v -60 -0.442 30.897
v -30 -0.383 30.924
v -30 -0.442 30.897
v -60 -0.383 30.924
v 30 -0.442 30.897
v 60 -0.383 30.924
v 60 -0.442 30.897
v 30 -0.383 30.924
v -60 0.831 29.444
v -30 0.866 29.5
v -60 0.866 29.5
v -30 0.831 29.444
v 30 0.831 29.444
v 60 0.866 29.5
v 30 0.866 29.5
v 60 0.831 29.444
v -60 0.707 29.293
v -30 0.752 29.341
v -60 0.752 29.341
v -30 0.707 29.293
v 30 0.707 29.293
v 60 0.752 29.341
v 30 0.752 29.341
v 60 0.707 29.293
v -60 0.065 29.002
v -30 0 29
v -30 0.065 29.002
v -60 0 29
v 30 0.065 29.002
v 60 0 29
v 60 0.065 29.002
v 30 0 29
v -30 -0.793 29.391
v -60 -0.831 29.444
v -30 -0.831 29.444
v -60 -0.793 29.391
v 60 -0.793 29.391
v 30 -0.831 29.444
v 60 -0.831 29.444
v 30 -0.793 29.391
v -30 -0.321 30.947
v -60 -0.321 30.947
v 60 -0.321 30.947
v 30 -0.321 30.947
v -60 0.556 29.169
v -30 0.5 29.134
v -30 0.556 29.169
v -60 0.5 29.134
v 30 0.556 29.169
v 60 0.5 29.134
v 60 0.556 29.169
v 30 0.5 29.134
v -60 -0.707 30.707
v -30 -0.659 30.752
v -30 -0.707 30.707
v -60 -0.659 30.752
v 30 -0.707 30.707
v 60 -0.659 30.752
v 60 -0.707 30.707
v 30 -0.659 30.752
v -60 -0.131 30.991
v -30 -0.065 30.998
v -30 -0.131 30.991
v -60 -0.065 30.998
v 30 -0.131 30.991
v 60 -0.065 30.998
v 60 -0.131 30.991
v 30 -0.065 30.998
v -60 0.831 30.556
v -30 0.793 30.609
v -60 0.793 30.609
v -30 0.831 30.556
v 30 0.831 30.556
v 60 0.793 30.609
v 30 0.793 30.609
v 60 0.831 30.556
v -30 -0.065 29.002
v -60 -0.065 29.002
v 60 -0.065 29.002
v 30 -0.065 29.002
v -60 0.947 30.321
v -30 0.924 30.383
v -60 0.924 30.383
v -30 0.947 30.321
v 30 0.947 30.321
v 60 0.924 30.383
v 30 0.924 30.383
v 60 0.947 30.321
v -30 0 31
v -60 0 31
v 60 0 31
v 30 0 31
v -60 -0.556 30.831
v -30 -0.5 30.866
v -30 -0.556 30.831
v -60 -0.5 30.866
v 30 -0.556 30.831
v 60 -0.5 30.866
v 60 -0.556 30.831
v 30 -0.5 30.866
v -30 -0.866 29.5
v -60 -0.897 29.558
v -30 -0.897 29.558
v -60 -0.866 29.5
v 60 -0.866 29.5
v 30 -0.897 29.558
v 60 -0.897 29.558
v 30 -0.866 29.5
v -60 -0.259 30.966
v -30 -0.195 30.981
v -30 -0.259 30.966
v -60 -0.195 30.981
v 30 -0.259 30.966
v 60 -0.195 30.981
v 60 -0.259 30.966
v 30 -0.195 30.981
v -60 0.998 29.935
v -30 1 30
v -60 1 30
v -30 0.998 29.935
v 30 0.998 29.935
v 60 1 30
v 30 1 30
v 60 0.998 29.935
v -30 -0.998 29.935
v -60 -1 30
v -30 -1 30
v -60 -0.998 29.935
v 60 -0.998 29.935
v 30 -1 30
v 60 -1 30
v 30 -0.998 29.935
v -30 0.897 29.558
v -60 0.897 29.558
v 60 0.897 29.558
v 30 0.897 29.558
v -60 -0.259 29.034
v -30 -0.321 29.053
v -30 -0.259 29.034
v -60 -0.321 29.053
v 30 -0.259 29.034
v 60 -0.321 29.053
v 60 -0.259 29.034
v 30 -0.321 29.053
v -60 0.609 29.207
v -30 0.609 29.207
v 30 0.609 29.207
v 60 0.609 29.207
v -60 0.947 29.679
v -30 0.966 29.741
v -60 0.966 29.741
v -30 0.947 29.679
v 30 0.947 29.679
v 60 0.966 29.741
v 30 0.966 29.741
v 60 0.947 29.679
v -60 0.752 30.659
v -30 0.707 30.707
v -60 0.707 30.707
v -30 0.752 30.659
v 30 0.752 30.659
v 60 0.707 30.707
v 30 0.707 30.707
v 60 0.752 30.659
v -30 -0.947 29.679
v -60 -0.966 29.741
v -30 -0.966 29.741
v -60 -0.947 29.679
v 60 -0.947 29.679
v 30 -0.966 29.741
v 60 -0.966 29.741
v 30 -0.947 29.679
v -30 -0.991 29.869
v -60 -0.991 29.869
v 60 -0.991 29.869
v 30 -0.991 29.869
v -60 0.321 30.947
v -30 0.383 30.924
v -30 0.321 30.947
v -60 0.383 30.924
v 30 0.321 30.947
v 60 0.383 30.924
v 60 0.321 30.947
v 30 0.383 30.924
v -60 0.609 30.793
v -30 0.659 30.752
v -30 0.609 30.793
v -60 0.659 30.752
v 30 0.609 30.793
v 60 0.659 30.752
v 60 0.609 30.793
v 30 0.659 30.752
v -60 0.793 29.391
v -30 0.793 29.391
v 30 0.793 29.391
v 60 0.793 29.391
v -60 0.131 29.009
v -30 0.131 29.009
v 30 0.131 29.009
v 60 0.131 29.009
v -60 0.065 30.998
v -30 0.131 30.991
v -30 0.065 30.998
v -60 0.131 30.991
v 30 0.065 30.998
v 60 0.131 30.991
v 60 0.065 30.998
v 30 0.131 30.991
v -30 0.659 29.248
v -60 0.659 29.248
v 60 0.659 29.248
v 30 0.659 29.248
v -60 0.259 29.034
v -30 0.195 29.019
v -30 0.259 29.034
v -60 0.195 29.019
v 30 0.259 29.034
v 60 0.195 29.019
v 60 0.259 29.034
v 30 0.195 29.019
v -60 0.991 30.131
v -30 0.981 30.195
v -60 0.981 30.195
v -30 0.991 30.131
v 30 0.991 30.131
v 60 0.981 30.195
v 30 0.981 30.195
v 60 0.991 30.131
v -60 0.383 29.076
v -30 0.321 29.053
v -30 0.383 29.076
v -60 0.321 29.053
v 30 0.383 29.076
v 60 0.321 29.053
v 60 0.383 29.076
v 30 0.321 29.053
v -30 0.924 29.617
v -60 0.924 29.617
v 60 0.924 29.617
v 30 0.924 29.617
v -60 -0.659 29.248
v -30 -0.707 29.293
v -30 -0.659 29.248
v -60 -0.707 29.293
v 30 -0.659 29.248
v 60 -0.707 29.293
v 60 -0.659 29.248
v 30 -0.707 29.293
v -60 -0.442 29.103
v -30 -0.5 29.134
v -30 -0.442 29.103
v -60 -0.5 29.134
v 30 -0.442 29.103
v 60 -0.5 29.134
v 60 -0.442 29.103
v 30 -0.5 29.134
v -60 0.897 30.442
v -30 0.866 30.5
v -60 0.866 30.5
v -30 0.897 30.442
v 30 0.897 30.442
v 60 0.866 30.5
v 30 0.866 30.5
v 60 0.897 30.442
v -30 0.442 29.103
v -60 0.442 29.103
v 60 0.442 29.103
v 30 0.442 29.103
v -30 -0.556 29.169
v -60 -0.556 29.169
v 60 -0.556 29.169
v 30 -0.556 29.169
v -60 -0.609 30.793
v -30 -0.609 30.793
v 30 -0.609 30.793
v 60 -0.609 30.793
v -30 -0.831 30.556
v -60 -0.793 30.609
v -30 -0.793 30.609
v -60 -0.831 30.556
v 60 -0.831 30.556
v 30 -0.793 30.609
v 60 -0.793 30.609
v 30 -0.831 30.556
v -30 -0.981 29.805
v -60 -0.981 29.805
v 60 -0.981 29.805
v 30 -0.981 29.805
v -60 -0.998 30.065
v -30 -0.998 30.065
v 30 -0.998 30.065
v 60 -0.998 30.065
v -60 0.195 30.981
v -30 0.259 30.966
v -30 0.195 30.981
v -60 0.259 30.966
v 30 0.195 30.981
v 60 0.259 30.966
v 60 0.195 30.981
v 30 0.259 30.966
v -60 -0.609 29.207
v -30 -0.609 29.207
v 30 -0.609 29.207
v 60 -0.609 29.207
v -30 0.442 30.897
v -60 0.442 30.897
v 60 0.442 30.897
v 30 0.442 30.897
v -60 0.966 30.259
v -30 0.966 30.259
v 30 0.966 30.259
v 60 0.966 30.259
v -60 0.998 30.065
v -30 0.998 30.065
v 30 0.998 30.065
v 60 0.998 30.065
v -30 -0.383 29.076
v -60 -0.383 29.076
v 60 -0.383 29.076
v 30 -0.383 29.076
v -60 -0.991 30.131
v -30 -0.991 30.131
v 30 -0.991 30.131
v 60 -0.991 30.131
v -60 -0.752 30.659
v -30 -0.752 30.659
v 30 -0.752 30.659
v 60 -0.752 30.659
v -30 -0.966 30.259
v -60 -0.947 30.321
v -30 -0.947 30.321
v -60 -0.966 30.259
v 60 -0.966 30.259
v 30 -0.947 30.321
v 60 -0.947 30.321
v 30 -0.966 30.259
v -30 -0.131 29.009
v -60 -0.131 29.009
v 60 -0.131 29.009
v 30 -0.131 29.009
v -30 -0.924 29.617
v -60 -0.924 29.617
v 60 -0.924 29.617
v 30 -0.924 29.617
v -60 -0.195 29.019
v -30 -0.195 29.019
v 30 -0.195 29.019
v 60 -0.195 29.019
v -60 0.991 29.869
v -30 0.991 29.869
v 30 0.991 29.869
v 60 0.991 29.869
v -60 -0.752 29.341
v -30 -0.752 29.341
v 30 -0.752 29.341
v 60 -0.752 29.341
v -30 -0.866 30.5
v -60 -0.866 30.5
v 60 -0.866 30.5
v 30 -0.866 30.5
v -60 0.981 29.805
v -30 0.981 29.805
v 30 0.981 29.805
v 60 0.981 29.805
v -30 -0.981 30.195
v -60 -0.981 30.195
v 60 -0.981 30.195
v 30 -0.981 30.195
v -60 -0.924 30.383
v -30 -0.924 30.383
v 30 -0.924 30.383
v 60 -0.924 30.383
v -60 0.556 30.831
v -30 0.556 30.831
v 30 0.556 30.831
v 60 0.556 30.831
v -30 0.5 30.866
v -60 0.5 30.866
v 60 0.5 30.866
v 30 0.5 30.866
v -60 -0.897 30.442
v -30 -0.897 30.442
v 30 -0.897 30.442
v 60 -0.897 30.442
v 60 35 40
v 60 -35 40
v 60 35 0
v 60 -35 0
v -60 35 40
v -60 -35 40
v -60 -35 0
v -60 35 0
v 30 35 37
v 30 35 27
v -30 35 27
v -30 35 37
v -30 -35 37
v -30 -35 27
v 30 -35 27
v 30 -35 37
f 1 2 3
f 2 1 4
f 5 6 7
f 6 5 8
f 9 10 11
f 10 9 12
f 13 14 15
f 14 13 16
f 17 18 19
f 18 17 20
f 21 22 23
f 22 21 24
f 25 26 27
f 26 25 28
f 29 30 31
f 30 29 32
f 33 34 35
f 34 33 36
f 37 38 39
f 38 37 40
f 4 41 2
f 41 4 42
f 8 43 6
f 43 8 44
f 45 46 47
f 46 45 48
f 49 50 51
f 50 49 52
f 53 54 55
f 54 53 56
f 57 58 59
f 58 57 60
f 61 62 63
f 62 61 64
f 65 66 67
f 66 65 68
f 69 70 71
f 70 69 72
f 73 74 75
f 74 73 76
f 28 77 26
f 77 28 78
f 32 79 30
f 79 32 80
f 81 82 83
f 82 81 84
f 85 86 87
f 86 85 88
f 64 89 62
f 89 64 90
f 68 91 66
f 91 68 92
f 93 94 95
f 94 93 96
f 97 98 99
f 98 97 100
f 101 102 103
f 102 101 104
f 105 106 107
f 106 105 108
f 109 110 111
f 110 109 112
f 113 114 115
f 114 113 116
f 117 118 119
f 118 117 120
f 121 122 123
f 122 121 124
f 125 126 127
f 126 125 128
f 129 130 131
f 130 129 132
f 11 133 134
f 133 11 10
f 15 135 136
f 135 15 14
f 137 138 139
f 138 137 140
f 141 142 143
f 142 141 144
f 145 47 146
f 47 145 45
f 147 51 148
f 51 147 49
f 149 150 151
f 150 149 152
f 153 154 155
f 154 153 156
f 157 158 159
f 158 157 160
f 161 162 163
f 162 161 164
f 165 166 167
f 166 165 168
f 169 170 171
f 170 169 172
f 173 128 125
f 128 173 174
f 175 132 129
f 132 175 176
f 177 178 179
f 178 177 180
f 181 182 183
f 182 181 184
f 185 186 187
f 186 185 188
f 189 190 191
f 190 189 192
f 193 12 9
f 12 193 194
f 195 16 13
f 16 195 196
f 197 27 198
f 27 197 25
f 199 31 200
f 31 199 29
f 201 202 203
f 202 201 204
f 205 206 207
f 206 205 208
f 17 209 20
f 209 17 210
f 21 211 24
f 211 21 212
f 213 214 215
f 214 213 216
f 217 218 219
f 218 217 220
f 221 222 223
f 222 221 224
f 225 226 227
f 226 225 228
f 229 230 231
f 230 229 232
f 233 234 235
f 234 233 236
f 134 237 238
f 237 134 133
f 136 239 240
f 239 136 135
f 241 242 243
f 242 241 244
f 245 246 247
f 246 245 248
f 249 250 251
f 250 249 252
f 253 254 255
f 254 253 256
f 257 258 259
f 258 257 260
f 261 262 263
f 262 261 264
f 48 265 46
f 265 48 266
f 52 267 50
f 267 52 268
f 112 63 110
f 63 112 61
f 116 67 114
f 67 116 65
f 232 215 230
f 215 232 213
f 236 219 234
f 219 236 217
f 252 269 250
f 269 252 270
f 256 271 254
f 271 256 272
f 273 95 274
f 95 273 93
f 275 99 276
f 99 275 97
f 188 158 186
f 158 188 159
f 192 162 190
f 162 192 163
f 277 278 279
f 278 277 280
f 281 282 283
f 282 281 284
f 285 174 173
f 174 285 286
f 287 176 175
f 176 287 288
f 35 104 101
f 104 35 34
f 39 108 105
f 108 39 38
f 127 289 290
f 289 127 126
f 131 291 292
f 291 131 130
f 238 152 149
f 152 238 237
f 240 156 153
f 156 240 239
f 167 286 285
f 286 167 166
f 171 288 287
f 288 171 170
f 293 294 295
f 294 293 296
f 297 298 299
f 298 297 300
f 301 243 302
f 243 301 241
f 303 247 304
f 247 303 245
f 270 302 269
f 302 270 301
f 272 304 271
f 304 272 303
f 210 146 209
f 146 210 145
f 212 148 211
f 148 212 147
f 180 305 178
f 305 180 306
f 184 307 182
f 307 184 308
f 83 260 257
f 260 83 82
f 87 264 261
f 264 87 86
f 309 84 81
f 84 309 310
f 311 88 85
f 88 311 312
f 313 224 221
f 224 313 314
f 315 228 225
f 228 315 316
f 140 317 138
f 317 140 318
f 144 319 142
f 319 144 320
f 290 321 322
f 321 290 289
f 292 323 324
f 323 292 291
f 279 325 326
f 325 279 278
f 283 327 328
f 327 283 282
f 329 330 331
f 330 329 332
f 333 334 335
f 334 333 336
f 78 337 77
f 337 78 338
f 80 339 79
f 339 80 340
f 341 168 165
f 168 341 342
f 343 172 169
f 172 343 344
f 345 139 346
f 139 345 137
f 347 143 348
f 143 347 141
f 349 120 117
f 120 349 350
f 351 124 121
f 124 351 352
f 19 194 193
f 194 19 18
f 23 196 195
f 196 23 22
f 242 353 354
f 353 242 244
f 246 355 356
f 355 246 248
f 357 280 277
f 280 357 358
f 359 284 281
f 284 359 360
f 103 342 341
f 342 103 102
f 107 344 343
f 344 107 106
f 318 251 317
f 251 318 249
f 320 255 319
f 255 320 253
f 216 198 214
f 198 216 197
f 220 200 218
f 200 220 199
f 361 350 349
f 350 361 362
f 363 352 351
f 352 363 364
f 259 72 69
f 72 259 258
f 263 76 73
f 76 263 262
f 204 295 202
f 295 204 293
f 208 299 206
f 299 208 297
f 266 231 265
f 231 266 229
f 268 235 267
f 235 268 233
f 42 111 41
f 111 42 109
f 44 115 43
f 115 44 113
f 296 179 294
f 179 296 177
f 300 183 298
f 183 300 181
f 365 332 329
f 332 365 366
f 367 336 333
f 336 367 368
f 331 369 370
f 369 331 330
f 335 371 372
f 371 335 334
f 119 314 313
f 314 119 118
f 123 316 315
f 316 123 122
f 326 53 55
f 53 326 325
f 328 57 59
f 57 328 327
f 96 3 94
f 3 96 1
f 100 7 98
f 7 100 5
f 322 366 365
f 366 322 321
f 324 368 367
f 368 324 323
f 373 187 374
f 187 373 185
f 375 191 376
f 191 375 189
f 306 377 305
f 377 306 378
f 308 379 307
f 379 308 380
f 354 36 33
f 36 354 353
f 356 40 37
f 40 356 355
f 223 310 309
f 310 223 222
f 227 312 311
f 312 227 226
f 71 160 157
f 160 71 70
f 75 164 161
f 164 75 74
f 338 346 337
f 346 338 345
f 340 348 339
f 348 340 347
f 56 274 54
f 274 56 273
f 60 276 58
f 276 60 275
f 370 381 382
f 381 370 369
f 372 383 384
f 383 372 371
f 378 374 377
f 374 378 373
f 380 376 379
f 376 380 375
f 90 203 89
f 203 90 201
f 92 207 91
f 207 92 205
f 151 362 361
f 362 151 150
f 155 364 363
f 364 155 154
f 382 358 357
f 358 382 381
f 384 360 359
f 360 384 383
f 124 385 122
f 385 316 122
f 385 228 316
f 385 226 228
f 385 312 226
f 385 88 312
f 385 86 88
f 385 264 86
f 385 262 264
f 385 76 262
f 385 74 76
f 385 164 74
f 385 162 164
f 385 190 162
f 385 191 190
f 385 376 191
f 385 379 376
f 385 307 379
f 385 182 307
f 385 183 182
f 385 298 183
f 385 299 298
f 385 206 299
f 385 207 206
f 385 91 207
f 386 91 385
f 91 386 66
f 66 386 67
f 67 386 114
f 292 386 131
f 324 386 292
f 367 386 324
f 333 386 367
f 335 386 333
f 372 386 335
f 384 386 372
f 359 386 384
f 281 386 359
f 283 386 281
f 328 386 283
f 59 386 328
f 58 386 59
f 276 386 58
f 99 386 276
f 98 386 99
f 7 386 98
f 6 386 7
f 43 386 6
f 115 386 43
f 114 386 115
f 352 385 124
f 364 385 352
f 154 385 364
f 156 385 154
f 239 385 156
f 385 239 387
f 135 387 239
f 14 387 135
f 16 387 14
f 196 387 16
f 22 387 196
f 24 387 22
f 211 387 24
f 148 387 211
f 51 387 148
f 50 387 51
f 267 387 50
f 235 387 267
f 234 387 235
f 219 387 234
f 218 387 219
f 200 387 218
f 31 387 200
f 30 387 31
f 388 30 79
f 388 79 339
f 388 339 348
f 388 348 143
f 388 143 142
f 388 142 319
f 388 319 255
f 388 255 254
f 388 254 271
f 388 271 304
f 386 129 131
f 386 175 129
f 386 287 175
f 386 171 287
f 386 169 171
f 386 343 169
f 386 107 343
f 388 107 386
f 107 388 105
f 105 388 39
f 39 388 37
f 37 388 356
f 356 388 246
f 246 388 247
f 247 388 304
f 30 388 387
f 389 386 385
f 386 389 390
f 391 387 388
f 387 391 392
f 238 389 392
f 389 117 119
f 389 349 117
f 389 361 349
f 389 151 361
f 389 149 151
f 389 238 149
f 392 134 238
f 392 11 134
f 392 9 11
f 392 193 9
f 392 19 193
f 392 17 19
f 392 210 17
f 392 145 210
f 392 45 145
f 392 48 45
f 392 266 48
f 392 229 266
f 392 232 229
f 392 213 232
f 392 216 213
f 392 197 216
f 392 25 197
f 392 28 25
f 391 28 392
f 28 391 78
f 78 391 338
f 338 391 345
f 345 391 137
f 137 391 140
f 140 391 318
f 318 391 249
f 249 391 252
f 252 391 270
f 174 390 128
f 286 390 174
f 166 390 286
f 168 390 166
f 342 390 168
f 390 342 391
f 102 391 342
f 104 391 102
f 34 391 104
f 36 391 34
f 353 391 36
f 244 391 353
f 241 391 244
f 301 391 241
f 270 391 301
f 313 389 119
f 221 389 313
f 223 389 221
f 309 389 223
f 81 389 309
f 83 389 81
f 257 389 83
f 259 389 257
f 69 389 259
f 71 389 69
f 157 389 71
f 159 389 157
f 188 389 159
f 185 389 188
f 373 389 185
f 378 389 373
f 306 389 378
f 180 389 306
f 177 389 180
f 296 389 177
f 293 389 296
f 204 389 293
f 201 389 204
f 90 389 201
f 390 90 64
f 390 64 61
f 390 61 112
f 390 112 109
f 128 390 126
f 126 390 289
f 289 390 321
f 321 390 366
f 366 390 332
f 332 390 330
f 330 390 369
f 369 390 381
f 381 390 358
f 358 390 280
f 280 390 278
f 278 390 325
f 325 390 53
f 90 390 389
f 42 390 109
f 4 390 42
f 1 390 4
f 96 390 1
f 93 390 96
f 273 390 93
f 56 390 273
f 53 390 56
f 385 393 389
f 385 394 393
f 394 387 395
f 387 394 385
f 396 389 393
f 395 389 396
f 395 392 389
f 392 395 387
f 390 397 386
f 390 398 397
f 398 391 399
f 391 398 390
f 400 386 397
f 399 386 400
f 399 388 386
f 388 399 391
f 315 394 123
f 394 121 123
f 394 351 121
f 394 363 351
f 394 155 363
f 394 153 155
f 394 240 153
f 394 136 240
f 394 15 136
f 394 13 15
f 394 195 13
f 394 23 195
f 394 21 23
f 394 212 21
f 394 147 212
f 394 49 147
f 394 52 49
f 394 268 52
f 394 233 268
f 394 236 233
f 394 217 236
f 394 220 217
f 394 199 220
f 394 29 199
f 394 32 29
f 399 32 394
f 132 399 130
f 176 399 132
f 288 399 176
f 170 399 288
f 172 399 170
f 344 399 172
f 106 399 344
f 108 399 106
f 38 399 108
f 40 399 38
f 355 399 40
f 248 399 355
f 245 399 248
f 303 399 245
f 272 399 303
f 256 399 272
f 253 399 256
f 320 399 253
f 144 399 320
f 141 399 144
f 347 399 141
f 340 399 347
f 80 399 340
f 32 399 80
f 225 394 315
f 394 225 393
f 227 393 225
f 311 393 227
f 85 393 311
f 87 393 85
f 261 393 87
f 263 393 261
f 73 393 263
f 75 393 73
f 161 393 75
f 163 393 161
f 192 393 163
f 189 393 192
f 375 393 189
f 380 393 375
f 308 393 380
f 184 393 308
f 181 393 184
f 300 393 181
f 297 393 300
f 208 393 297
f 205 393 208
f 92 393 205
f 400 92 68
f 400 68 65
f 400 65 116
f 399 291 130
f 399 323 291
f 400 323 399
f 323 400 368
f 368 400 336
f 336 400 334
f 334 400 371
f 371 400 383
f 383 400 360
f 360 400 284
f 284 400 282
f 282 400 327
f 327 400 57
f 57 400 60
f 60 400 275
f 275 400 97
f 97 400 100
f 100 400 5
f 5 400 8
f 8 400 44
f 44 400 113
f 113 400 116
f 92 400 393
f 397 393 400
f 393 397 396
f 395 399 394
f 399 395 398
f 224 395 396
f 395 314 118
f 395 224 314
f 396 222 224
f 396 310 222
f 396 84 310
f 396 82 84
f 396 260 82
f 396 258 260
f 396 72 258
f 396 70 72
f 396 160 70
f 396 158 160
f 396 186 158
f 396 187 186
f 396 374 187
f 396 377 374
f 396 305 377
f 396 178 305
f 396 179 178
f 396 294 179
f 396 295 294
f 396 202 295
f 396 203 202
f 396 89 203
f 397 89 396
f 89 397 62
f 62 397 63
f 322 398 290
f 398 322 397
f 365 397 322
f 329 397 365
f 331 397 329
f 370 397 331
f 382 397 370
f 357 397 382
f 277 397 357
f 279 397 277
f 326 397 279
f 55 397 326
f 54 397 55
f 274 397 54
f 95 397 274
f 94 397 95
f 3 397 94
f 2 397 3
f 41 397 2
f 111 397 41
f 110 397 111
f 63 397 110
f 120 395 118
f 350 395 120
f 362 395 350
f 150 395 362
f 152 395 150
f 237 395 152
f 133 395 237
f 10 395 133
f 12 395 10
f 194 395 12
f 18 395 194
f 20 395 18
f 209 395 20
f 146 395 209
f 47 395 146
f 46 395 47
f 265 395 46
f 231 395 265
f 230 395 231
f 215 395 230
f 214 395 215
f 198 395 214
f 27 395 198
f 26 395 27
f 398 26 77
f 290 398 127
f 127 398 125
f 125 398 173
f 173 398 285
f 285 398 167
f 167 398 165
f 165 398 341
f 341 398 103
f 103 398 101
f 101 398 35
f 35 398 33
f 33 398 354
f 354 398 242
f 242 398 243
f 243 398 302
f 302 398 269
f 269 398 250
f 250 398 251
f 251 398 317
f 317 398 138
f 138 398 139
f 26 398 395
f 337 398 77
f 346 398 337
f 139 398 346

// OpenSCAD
// Mini horizontal gel-electrophoresis buffer tank
// Print orientation: open top facing up (+Z), resting on XY plane at z = 0

// ---------- Parameters ----------
outer_x   = 120;   // outer length along X (mm)
outer_y   = 70;    // outer width along Y (mm)
outer_z   = 40;    // outer height along Z (mm)
wall      = 3;     // wall thickness (mm)
floor     = 3;     // floor thickness (mm)

platform_x = 60;   // platform length along X (mm), centred
platform_y = outer_y; // platform spans full inner width (mm)
platform_top = outer_z - wall; // platform top height (mm) = 37 (10 mm above inner floor)

hole_d = 2;        // electrode hole diameter (mm)
hole_y = 0;        // electrode hole Y position (mm)
hole_z = 30;       // electrode hole Z position (mm)

eps = 0.5;         // cutter overshoot past faces (mm)

$fn = 96;

// ---------- Derived ----------
inner_x = outer_x - 2 * wall;   // 114 mm
inner_z = outer_z - floor;      // 37 mm (inner floor at z = 3, inner ceiling at z = 37)

// ---------- Model ----------
difference() {
    // Main tank body (open top)
    translate([-outer_x / 2, -outer_y / 2, 0])
        cube([outer_x, outer_y, outer_z]);

    // Raised platform for gel tray, centred in X, spanning full Y
    translate([-platform_x / 2, -platform_y / 2, platform_top - 10])
        cube([platform_x, platform_y, 10]);

    // Horizontal electrode holes through each end wall, along X
    for (s = [-1, 1])
        translate([s * (outer_x / 2 + eps), hole_y, hole_z])
            rotate([0, 90, 0])
                cylinder(d = hole_d, h = outer_x + 2 * eps);
}
